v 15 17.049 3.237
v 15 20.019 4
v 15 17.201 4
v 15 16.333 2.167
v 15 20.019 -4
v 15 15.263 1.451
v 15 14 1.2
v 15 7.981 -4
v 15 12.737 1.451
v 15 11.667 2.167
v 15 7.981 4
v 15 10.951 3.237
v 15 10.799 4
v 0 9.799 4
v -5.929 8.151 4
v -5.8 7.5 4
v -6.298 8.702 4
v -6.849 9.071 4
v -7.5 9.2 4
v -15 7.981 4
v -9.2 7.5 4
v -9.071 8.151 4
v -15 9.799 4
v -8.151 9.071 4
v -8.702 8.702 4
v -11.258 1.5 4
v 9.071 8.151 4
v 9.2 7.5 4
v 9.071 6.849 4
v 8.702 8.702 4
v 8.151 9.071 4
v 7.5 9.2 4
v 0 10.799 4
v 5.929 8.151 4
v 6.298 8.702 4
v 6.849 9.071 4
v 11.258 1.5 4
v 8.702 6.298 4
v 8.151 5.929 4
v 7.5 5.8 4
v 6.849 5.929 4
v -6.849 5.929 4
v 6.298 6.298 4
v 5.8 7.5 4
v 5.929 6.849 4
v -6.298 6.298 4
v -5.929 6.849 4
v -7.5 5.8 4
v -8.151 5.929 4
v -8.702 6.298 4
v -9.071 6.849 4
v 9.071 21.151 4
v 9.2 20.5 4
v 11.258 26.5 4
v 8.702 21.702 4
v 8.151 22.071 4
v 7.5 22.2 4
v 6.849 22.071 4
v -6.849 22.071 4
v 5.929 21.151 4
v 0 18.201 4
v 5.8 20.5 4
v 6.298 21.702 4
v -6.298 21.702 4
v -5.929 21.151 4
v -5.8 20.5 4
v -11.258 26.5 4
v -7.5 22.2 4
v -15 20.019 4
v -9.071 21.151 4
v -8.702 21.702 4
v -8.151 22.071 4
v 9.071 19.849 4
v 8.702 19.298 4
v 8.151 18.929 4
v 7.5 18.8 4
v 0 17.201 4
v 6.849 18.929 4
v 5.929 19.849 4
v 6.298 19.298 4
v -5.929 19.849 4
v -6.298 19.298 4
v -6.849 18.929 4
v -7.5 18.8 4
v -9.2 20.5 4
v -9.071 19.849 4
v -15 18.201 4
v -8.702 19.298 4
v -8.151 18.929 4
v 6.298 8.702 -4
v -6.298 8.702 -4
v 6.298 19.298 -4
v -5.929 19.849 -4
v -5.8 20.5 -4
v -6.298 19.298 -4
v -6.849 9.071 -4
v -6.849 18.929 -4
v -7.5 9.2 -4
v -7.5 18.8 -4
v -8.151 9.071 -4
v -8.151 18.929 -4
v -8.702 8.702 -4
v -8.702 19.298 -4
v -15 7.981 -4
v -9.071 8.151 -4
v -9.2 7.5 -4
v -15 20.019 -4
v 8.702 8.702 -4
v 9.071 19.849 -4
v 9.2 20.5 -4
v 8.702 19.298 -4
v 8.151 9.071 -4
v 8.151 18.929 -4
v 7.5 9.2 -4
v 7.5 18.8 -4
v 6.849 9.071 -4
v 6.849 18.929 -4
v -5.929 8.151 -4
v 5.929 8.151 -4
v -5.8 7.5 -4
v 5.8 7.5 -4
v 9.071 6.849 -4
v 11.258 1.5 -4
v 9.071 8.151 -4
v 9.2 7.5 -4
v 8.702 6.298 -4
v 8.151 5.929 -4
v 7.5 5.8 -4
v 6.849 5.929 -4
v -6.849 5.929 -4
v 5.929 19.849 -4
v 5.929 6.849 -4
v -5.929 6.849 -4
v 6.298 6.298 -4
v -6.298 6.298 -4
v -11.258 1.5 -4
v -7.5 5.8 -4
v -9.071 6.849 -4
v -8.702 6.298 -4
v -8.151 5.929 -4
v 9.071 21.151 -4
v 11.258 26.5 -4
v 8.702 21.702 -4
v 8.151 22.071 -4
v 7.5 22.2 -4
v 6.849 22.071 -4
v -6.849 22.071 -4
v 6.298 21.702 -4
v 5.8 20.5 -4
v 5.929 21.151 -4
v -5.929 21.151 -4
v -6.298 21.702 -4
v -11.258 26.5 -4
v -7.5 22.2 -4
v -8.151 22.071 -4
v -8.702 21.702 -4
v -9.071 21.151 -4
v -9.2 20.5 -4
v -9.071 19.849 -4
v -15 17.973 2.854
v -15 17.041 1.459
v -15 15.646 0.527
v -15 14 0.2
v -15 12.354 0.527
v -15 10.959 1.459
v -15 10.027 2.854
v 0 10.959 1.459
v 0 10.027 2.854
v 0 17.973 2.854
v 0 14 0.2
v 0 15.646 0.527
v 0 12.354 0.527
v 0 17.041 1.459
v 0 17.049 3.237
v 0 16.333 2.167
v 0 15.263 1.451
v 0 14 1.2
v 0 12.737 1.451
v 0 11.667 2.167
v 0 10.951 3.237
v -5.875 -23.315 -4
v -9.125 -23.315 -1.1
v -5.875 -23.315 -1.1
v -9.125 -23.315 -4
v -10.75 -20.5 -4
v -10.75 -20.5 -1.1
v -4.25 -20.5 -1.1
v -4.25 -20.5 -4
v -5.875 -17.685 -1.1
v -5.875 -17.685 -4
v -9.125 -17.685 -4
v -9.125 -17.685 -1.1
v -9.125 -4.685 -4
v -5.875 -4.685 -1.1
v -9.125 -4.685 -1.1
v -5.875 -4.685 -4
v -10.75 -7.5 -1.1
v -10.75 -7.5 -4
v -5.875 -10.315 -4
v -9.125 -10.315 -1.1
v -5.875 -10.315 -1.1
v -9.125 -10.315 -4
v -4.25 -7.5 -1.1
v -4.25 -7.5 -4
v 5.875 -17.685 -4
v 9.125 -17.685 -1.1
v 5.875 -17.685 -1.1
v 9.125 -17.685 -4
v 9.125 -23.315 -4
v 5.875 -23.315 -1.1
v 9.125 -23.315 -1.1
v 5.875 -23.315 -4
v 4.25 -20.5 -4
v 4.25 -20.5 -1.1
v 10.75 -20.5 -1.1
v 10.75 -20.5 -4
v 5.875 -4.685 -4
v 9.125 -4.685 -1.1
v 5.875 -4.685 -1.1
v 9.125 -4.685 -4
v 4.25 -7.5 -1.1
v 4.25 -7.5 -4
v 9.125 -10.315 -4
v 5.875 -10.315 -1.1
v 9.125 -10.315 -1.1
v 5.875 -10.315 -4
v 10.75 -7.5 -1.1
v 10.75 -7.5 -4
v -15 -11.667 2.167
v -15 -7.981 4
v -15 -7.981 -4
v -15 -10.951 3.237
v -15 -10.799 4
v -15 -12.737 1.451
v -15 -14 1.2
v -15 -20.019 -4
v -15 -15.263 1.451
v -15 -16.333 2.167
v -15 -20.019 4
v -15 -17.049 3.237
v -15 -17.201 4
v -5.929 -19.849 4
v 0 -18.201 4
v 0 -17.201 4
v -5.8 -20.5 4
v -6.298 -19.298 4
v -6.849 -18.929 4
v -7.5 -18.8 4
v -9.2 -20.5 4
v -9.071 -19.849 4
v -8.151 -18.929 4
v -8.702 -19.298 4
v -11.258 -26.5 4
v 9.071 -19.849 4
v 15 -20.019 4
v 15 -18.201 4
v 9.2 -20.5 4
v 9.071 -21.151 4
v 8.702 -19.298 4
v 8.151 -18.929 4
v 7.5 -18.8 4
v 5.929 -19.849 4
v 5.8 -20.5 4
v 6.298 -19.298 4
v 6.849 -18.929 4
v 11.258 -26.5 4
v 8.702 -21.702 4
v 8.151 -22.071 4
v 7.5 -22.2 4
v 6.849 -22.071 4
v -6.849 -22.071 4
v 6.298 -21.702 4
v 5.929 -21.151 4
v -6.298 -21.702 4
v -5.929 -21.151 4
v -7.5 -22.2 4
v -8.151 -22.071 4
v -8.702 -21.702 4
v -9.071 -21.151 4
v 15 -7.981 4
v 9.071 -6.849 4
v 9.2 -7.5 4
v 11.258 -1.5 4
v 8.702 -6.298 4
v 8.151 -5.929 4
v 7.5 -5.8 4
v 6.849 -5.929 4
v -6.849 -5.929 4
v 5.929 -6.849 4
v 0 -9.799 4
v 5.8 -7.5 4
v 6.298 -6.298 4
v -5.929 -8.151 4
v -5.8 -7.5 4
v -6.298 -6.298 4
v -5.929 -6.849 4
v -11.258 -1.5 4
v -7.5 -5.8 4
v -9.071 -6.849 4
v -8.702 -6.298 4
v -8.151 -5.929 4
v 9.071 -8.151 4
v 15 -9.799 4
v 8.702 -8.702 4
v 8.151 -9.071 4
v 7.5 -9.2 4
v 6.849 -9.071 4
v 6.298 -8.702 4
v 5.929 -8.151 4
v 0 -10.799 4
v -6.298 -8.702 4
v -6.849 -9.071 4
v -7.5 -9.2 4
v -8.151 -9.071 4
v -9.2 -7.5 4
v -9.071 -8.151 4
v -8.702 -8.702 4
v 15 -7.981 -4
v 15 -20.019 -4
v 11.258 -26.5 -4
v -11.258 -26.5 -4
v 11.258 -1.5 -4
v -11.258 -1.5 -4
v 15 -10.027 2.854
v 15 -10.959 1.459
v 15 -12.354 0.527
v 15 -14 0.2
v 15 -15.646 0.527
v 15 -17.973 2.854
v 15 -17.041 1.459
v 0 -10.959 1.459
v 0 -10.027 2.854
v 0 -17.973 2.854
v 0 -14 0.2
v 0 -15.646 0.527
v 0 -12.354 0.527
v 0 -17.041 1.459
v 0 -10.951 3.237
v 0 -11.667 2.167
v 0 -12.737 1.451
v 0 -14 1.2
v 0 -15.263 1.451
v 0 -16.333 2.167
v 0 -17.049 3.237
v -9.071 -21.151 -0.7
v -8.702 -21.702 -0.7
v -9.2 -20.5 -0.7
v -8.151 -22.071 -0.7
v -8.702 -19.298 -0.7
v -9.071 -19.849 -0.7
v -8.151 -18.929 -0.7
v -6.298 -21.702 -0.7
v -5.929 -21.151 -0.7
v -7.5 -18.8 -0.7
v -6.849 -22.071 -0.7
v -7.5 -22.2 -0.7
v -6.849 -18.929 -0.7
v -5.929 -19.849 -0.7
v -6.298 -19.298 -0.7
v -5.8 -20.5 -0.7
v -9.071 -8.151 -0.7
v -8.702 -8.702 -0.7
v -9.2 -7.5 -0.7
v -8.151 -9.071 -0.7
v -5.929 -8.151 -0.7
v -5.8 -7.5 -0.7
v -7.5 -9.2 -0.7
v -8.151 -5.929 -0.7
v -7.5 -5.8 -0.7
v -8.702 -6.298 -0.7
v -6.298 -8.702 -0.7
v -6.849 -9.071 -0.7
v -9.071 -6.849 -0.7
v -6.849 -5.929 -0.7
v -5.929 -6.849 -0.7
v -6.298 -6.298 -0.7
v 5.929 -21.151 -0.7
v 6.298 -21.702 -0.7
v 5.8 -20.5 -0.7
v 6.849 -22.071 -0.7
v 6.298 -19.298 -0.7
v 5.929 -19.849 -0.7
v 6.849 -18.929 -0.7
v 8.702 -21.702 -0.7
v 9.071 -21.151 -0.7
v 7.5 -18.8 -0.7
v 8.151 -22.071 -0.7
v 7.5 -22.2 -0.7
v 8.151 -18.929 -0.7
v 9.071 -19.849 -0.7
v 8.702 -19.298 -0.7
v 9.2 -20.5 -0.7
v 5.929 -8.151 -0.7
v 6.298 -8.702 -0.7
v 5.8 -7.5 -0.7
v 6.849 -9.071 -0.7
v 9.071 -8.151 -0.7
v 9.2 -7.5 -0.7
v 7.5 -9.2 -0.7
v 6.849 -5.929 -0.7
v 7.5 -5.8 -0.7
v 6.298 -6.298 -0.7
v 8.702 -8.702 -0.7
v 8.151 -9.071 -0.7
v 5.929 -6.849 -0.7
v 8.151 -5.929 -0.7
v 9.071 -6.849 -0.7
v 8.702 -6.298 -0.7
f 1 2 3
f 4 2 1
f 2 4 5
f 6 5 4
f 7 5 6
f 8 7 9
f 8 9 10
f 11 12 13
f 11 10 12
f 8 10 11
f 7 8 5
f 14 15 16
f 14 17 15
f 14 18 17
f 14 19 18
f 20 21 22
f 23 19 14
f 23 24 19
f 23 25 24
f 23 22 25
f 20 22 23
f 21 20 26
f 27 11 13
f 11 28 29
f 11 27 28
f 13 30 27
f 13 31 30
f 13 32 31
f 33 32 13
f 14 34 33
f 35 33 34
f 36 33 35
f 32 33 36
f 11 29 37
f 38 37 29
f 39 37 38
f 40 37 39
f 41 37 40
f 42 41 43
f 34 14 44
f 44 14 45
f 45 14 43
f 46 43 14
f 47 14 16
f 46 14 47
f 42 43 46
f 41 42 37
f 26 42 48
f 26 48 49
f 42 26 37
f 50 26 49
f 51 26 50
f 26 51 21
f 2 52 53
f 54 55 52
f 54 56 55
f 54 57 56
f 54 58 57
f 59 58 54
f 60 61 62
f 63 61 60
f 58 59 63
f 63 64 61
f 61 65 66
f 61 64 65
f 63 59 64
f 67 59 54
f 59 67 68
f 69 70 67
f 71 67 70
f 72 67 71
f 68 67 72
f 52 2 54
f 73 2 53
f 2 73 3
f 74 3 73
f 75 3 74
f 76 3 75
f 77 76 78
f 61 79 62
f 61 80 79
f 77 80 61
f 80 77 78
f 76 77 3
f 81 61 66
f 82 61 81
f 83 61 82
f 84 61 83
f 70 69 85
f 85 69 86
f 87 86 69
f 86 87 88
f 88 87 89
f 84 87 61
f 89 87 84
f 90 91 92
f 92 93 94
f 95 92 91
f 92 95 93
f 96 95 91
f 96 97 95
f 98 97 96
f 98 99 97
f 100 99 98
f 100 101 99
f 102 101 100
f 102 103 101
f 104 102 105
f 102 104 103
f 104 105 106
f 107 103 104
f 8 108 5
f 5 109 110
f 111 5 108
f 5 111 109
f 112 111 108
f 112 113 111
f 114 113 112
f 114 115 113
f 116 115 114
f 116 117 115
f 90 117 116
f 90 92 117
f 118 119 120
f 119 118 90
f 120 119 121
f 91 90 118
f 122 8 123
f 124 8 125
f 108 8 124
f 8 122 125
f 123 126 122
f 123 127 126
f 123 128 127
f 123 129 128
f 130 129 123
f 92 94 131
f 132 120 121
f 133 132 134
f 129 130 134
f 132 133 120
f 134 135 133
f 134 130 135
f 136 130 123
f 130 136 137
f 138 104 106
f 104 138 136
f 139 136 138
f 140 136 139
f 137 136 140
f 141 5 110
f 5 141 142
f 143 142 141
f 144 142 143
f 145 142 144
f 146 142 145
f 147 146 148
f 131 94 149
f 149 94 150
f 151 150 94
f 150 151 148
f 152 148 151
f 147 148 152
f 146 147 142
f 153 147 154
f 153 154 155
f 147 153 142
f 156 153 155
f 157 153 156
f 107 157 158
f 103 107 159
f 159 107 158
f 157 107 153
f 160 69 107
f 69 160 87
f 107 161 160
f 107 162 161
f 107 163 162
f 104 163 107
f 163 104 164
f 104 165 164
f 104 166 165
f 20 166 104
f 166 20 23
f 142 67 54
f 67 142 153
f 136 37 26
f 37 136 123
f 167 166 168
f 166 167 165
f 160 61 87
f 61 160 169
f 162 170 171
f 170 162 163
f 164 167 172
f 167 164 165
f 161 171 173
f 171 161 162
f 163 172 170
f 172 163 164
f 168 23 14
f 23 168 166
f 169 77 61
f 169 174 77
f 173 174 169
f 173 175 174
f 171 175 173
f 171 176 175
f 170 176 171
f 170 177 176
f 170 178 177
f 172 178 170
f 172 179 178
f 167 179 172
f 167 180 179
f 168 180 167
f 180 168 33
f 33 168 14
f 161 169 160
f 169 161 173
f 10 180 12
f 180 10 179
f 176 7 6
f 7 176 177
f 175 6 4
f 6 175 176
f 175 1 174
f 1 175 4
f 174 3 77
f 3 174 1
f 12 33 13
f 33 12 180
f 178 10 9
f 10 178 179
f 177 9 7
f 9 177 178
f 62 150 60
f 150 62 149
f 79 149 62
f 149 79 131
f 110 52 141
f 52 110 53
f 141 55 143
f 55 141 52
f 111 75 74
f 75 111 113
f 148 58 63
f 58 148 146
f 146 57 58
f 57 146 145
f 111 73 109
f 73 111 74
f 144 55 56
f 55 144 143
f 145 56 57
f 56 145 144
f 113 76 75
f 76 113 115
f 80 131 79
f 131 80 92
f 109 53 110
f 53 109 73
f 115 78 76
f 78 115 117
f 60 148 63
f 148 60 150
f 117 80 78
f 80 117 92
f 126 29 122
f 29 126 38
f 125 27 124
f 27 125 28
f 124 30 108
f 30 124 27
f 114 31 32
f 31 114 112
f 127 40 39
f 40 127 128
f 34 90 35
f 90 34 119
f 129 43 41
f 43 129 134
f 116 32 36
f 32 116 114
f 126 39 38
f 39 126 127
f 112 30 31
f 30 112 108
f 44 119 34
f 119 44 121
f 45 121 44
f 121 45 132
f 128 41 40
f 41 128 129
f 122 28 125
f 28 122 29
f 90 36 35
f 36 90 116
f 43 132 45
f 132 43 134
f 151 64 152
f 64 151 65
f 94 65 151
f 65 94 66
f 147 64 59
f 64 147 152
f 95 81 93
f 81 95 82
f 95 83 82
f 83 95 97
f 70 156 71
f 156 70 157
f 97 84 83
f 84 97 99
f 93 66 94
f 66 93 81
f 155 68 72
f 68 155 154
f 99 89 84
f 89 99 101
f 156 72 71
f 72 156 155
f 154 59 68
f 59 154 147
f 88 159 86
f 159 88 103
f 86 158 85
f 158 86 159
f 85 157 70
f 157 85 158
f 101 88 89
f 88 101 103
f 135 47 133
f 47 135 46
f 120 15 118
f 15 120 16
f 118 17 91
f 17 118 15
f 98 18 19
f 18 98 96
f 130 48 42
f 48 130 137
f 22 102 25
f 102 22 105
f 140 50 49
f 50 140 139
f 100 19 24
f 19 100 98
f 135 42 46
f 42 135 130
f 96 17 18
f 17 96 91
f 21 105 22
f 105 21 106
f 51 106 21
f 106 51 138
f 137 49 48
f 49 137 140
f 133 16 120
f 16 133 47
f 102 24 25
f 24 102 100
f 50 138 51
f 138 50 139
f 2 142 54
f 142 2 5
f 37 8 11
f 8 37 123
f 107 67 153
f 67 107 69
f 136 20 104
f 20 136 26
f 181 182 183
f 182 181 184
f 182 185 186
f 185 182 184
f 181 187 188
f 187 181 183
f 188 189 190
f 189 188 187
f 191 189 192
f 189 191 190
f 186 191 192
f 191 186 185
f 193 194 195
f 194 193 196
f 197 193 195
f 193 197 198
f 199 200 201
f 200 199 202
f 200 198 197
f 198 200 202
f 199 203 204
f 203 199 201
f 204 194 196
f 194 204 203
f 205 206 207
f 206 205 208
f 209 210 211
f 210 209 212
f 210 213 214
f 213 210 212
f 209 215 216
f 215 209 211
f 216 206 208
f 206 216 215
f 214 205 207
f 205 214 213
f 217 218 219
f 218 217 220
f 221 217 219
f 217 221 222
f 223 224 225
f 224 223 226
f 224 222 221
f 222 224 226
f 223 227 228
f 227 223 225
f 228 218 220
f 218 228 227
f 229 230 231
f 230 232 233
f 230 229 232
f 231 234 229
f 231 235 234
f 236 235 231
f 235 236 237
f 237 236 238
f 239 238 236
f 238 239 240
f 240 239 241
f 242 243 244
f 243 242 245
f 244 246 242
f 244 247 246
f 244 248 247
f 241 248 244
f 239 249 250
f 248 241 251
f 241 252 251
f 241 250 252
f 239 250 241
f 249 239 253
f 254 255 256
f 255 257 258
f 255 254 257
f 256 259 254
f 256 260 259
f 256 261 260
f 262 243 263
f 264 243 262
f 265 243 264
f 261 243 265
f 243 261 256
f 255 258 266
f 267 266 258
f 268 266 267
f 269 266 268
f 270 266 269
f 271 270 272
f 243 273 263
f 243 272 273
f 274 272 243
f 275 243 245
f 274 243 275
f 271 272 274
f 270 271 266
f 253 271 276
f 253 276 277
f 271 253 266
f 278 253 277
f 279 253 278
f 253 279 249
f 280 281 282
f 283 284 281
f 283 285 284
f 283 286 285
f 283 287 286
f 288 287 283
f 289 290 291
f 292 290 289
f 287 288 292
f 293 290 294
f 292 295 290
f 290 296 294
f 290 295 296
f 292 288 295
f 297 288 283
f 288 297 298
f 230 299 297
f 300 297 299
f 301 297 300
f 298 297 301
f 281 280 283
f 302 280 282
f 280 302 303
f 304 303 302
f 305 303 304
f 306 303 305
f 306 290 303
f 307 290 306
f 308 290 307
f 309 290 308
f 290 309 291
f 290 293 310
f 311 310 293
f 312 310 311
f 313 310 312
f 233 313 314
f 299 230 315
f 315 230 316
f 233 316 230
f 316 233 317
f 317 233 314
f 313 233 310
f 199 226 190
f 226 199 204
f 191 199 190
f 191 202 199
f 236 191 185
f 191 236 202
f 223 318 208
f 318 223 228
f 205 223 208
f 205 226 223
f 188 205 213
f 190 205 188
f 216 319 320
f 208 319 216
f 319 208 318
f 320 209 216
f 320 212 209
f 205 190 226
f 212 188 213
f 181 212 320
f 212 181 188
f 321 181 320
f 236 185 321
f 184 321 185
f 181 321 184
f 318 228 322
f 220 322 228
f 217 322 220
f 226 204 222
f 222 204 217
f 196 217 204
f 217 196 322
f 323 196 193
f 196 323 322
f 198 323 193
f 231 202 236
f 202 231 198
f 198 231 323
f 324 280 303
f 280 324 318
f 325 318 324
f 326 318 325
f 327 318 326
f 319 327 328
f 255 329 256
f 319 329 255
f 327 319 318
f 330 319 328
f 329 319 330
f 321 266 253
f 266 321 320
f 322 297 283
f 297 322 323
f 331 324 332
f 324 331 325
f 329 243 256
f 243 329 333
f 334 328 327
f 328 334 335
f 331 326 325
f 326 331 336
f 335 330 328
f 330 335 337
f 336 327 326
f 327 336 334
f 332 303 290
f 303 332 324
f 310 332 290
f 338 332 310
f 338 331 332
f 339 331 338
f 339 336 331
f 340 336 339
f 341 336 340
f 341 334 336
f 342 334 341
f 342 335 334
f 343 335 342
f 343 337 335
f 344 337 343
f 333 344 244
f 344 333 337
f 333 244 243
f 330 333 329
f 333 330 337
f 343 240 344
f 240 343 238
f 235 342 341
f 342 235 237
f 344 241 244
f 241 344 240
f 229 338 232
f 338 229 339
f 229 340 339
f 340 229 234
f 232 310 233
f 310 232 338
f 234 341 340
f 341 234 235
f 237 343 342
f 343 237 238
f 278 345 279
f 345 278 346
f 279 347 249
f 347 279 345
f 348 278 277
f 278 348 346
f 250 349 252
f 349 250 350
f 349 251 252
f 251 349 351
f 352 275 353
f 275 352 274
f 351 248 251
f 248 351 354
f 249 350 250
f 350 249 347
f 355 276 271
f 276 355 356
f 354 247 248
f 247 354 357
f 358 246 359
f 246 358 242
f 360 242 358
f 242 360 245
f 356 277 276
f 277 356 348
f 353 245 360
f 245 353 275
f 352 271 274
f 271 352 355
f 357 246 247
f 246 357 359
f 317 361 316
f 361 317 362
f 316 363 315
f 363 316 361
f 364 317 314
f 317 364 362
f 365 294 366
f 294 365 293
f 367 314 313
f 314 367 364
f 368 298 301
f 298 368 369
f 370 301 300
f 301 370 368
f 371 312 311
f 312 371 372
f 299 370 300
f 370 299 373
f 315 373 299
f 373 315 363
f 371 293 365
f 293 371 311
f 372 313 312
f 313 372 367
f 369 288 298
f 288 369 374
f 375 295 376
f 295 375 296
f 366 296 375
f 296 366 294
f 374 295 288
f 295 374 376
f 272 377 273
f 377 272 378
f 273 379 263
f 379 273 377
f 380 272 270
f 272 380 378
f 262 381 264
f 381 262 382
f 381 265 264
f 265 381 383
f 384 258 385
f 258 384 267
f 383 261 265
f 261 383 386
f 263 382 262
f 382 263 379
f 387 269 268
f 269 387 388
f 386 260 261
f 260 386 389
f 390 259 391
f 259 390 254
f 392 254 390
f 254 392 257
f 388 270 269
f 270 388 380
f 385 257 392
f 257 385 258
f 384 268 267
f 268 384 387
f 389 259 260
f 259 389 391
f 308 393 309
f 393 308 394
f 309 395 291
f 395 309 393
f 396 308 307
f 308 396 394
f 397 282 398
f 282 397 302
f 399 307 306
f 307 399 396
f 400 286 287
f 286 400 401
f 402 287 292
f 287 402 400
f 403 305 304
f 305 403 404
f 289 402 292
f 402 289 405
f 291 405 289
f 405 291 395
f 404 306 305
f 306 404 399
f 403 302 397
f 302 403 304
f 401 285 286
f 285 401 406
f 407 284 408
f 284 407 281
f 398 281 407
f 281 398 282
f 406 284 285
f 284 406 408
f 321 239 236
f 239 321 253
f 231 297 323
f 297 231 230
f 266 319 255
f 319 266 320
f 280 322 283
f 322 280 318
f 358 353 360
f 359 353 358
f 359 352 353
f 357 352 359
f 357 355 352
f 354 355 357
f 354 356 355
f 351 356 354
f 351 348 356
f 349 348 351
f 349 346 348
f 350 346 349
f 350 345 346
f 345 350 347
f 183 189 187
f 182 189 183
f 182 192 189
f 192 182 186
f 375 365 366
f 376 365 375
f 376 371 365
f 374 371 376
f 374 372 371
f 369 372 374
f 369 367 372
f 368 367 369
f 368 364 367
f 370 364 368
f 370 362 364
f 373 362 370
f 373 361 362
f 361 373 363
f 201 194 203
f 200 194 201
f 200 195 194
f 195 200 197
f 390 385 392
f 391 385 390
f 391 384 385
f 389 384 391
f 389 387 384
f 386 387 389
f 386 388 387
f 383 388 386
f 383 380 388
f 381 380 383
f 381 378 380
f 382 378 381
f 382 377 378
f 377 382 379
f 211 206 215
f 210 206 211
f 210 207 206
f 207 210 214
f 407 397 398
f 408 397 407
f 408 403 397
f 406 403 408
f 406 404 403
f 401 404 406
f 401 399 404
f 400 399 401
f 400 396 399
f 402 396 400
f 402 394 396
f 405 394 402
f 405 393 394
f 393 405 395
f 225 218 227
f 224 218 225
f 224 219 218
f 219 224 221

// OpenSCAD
holeX = 7.5;
holeY = 6.5;

holeR = 3.4 / 2;
nutR = 3.25;
nutH = 3;
corner_cut = 26;

studding_dia = 8.6;
shaft_dia = 6.6;

module coupling(c){
    union(){
        difference(){
            cube(size = [30,25,8], center = true);

            if(c==1){
                //slot
            	*cube(size = [2,40,30], center = true);
                
                //nut holes
            	translate([ holeX,  holeY, nutH/2 - 4.01]) cylinder(h = nutH, r=nutR, $fn=6, center=true);
            	translate([ holeX, -holeY, nutH/2 - 4.01]) cylinder(h = nutH, r=nutR, $fn=6, center=true);
            	translate([-holeX,  holeY, nutH/2 - 4.01]) cylinder(h = nutH, r=nutR, $fn=6, center=true);
            	translate([-holeX, -holeY, nutH/2 - 4.01]) cylinder(h = nutH, r=nutR, $fn=6, center=true);
            }

            //shaft groves
            translate([ -16, 0, 4.5]) rotate([0,90,0]) cylinder(h = 16, r=studding_dia / 2, $fn=16);
            translate([-0.5, 0, 4.5]) rotate([0,90,0]) cylinder(h = 16, r=shaft_dia / 2,    $fn=16);

            //screw holes
            translate([ holeX,  holeY, -10]) cylinder(h = 20, r=holeR, $fn=16);
            translate([ holeX, -holeY, -10]) cylinder(h = 20, r=holeR, $fn=16);
            translate([-holeX,  holeY, -10]) cylinder(h = 20, r=holeR, $fn=16);
            translate([-holeX, -holeY, -10]) cylinder(h = 20, r=holeR, $fn=16);

            //corners
            rotate([0,0,30])   translate([corner_cut, 0, 0]) cube(size = [20,40,20], center = true);
            rotate([0,0,-30])  translate([corner_cut, 0, 0]) cube(size = [20,40,20], center = true);
            rotate([0,0,150])  translate([corner_cut, 0, 0]) cube(size = [20,40,20], center = true);
            rotate([0,0,-150]) translate([corner_cut, 0, 0]) cube(size = [20,40,20], center = true);
        }
        if(c==1){
            // bridge
        	translate([ holeX,  holeY, nutH-3.9]) cylinder(h = 0.4, r=nutR+0.1, $fn=6, center=true);
        	translate([ holeX, -holeY, nutH-3.9]) cylinder(h = 0.4, r=nutR+0.1, $fn=6, center=true);
        	translate([-holeX,  holeY, nutH-3.9]) cylinder(h = 0.4, r=nutR+0.1, $fn=6, center=true);
        	translate([-holeX, -holeY, nutH-3.9]) cylinder(h = 0.4, r=nutR+0.1, $fn=6, center=true);
        }
    }
}

translate([0, 14, 0]) coupling(c=0);
translate([0, -14, 0]) rotate([0,0,180]) coupling(c=1);
